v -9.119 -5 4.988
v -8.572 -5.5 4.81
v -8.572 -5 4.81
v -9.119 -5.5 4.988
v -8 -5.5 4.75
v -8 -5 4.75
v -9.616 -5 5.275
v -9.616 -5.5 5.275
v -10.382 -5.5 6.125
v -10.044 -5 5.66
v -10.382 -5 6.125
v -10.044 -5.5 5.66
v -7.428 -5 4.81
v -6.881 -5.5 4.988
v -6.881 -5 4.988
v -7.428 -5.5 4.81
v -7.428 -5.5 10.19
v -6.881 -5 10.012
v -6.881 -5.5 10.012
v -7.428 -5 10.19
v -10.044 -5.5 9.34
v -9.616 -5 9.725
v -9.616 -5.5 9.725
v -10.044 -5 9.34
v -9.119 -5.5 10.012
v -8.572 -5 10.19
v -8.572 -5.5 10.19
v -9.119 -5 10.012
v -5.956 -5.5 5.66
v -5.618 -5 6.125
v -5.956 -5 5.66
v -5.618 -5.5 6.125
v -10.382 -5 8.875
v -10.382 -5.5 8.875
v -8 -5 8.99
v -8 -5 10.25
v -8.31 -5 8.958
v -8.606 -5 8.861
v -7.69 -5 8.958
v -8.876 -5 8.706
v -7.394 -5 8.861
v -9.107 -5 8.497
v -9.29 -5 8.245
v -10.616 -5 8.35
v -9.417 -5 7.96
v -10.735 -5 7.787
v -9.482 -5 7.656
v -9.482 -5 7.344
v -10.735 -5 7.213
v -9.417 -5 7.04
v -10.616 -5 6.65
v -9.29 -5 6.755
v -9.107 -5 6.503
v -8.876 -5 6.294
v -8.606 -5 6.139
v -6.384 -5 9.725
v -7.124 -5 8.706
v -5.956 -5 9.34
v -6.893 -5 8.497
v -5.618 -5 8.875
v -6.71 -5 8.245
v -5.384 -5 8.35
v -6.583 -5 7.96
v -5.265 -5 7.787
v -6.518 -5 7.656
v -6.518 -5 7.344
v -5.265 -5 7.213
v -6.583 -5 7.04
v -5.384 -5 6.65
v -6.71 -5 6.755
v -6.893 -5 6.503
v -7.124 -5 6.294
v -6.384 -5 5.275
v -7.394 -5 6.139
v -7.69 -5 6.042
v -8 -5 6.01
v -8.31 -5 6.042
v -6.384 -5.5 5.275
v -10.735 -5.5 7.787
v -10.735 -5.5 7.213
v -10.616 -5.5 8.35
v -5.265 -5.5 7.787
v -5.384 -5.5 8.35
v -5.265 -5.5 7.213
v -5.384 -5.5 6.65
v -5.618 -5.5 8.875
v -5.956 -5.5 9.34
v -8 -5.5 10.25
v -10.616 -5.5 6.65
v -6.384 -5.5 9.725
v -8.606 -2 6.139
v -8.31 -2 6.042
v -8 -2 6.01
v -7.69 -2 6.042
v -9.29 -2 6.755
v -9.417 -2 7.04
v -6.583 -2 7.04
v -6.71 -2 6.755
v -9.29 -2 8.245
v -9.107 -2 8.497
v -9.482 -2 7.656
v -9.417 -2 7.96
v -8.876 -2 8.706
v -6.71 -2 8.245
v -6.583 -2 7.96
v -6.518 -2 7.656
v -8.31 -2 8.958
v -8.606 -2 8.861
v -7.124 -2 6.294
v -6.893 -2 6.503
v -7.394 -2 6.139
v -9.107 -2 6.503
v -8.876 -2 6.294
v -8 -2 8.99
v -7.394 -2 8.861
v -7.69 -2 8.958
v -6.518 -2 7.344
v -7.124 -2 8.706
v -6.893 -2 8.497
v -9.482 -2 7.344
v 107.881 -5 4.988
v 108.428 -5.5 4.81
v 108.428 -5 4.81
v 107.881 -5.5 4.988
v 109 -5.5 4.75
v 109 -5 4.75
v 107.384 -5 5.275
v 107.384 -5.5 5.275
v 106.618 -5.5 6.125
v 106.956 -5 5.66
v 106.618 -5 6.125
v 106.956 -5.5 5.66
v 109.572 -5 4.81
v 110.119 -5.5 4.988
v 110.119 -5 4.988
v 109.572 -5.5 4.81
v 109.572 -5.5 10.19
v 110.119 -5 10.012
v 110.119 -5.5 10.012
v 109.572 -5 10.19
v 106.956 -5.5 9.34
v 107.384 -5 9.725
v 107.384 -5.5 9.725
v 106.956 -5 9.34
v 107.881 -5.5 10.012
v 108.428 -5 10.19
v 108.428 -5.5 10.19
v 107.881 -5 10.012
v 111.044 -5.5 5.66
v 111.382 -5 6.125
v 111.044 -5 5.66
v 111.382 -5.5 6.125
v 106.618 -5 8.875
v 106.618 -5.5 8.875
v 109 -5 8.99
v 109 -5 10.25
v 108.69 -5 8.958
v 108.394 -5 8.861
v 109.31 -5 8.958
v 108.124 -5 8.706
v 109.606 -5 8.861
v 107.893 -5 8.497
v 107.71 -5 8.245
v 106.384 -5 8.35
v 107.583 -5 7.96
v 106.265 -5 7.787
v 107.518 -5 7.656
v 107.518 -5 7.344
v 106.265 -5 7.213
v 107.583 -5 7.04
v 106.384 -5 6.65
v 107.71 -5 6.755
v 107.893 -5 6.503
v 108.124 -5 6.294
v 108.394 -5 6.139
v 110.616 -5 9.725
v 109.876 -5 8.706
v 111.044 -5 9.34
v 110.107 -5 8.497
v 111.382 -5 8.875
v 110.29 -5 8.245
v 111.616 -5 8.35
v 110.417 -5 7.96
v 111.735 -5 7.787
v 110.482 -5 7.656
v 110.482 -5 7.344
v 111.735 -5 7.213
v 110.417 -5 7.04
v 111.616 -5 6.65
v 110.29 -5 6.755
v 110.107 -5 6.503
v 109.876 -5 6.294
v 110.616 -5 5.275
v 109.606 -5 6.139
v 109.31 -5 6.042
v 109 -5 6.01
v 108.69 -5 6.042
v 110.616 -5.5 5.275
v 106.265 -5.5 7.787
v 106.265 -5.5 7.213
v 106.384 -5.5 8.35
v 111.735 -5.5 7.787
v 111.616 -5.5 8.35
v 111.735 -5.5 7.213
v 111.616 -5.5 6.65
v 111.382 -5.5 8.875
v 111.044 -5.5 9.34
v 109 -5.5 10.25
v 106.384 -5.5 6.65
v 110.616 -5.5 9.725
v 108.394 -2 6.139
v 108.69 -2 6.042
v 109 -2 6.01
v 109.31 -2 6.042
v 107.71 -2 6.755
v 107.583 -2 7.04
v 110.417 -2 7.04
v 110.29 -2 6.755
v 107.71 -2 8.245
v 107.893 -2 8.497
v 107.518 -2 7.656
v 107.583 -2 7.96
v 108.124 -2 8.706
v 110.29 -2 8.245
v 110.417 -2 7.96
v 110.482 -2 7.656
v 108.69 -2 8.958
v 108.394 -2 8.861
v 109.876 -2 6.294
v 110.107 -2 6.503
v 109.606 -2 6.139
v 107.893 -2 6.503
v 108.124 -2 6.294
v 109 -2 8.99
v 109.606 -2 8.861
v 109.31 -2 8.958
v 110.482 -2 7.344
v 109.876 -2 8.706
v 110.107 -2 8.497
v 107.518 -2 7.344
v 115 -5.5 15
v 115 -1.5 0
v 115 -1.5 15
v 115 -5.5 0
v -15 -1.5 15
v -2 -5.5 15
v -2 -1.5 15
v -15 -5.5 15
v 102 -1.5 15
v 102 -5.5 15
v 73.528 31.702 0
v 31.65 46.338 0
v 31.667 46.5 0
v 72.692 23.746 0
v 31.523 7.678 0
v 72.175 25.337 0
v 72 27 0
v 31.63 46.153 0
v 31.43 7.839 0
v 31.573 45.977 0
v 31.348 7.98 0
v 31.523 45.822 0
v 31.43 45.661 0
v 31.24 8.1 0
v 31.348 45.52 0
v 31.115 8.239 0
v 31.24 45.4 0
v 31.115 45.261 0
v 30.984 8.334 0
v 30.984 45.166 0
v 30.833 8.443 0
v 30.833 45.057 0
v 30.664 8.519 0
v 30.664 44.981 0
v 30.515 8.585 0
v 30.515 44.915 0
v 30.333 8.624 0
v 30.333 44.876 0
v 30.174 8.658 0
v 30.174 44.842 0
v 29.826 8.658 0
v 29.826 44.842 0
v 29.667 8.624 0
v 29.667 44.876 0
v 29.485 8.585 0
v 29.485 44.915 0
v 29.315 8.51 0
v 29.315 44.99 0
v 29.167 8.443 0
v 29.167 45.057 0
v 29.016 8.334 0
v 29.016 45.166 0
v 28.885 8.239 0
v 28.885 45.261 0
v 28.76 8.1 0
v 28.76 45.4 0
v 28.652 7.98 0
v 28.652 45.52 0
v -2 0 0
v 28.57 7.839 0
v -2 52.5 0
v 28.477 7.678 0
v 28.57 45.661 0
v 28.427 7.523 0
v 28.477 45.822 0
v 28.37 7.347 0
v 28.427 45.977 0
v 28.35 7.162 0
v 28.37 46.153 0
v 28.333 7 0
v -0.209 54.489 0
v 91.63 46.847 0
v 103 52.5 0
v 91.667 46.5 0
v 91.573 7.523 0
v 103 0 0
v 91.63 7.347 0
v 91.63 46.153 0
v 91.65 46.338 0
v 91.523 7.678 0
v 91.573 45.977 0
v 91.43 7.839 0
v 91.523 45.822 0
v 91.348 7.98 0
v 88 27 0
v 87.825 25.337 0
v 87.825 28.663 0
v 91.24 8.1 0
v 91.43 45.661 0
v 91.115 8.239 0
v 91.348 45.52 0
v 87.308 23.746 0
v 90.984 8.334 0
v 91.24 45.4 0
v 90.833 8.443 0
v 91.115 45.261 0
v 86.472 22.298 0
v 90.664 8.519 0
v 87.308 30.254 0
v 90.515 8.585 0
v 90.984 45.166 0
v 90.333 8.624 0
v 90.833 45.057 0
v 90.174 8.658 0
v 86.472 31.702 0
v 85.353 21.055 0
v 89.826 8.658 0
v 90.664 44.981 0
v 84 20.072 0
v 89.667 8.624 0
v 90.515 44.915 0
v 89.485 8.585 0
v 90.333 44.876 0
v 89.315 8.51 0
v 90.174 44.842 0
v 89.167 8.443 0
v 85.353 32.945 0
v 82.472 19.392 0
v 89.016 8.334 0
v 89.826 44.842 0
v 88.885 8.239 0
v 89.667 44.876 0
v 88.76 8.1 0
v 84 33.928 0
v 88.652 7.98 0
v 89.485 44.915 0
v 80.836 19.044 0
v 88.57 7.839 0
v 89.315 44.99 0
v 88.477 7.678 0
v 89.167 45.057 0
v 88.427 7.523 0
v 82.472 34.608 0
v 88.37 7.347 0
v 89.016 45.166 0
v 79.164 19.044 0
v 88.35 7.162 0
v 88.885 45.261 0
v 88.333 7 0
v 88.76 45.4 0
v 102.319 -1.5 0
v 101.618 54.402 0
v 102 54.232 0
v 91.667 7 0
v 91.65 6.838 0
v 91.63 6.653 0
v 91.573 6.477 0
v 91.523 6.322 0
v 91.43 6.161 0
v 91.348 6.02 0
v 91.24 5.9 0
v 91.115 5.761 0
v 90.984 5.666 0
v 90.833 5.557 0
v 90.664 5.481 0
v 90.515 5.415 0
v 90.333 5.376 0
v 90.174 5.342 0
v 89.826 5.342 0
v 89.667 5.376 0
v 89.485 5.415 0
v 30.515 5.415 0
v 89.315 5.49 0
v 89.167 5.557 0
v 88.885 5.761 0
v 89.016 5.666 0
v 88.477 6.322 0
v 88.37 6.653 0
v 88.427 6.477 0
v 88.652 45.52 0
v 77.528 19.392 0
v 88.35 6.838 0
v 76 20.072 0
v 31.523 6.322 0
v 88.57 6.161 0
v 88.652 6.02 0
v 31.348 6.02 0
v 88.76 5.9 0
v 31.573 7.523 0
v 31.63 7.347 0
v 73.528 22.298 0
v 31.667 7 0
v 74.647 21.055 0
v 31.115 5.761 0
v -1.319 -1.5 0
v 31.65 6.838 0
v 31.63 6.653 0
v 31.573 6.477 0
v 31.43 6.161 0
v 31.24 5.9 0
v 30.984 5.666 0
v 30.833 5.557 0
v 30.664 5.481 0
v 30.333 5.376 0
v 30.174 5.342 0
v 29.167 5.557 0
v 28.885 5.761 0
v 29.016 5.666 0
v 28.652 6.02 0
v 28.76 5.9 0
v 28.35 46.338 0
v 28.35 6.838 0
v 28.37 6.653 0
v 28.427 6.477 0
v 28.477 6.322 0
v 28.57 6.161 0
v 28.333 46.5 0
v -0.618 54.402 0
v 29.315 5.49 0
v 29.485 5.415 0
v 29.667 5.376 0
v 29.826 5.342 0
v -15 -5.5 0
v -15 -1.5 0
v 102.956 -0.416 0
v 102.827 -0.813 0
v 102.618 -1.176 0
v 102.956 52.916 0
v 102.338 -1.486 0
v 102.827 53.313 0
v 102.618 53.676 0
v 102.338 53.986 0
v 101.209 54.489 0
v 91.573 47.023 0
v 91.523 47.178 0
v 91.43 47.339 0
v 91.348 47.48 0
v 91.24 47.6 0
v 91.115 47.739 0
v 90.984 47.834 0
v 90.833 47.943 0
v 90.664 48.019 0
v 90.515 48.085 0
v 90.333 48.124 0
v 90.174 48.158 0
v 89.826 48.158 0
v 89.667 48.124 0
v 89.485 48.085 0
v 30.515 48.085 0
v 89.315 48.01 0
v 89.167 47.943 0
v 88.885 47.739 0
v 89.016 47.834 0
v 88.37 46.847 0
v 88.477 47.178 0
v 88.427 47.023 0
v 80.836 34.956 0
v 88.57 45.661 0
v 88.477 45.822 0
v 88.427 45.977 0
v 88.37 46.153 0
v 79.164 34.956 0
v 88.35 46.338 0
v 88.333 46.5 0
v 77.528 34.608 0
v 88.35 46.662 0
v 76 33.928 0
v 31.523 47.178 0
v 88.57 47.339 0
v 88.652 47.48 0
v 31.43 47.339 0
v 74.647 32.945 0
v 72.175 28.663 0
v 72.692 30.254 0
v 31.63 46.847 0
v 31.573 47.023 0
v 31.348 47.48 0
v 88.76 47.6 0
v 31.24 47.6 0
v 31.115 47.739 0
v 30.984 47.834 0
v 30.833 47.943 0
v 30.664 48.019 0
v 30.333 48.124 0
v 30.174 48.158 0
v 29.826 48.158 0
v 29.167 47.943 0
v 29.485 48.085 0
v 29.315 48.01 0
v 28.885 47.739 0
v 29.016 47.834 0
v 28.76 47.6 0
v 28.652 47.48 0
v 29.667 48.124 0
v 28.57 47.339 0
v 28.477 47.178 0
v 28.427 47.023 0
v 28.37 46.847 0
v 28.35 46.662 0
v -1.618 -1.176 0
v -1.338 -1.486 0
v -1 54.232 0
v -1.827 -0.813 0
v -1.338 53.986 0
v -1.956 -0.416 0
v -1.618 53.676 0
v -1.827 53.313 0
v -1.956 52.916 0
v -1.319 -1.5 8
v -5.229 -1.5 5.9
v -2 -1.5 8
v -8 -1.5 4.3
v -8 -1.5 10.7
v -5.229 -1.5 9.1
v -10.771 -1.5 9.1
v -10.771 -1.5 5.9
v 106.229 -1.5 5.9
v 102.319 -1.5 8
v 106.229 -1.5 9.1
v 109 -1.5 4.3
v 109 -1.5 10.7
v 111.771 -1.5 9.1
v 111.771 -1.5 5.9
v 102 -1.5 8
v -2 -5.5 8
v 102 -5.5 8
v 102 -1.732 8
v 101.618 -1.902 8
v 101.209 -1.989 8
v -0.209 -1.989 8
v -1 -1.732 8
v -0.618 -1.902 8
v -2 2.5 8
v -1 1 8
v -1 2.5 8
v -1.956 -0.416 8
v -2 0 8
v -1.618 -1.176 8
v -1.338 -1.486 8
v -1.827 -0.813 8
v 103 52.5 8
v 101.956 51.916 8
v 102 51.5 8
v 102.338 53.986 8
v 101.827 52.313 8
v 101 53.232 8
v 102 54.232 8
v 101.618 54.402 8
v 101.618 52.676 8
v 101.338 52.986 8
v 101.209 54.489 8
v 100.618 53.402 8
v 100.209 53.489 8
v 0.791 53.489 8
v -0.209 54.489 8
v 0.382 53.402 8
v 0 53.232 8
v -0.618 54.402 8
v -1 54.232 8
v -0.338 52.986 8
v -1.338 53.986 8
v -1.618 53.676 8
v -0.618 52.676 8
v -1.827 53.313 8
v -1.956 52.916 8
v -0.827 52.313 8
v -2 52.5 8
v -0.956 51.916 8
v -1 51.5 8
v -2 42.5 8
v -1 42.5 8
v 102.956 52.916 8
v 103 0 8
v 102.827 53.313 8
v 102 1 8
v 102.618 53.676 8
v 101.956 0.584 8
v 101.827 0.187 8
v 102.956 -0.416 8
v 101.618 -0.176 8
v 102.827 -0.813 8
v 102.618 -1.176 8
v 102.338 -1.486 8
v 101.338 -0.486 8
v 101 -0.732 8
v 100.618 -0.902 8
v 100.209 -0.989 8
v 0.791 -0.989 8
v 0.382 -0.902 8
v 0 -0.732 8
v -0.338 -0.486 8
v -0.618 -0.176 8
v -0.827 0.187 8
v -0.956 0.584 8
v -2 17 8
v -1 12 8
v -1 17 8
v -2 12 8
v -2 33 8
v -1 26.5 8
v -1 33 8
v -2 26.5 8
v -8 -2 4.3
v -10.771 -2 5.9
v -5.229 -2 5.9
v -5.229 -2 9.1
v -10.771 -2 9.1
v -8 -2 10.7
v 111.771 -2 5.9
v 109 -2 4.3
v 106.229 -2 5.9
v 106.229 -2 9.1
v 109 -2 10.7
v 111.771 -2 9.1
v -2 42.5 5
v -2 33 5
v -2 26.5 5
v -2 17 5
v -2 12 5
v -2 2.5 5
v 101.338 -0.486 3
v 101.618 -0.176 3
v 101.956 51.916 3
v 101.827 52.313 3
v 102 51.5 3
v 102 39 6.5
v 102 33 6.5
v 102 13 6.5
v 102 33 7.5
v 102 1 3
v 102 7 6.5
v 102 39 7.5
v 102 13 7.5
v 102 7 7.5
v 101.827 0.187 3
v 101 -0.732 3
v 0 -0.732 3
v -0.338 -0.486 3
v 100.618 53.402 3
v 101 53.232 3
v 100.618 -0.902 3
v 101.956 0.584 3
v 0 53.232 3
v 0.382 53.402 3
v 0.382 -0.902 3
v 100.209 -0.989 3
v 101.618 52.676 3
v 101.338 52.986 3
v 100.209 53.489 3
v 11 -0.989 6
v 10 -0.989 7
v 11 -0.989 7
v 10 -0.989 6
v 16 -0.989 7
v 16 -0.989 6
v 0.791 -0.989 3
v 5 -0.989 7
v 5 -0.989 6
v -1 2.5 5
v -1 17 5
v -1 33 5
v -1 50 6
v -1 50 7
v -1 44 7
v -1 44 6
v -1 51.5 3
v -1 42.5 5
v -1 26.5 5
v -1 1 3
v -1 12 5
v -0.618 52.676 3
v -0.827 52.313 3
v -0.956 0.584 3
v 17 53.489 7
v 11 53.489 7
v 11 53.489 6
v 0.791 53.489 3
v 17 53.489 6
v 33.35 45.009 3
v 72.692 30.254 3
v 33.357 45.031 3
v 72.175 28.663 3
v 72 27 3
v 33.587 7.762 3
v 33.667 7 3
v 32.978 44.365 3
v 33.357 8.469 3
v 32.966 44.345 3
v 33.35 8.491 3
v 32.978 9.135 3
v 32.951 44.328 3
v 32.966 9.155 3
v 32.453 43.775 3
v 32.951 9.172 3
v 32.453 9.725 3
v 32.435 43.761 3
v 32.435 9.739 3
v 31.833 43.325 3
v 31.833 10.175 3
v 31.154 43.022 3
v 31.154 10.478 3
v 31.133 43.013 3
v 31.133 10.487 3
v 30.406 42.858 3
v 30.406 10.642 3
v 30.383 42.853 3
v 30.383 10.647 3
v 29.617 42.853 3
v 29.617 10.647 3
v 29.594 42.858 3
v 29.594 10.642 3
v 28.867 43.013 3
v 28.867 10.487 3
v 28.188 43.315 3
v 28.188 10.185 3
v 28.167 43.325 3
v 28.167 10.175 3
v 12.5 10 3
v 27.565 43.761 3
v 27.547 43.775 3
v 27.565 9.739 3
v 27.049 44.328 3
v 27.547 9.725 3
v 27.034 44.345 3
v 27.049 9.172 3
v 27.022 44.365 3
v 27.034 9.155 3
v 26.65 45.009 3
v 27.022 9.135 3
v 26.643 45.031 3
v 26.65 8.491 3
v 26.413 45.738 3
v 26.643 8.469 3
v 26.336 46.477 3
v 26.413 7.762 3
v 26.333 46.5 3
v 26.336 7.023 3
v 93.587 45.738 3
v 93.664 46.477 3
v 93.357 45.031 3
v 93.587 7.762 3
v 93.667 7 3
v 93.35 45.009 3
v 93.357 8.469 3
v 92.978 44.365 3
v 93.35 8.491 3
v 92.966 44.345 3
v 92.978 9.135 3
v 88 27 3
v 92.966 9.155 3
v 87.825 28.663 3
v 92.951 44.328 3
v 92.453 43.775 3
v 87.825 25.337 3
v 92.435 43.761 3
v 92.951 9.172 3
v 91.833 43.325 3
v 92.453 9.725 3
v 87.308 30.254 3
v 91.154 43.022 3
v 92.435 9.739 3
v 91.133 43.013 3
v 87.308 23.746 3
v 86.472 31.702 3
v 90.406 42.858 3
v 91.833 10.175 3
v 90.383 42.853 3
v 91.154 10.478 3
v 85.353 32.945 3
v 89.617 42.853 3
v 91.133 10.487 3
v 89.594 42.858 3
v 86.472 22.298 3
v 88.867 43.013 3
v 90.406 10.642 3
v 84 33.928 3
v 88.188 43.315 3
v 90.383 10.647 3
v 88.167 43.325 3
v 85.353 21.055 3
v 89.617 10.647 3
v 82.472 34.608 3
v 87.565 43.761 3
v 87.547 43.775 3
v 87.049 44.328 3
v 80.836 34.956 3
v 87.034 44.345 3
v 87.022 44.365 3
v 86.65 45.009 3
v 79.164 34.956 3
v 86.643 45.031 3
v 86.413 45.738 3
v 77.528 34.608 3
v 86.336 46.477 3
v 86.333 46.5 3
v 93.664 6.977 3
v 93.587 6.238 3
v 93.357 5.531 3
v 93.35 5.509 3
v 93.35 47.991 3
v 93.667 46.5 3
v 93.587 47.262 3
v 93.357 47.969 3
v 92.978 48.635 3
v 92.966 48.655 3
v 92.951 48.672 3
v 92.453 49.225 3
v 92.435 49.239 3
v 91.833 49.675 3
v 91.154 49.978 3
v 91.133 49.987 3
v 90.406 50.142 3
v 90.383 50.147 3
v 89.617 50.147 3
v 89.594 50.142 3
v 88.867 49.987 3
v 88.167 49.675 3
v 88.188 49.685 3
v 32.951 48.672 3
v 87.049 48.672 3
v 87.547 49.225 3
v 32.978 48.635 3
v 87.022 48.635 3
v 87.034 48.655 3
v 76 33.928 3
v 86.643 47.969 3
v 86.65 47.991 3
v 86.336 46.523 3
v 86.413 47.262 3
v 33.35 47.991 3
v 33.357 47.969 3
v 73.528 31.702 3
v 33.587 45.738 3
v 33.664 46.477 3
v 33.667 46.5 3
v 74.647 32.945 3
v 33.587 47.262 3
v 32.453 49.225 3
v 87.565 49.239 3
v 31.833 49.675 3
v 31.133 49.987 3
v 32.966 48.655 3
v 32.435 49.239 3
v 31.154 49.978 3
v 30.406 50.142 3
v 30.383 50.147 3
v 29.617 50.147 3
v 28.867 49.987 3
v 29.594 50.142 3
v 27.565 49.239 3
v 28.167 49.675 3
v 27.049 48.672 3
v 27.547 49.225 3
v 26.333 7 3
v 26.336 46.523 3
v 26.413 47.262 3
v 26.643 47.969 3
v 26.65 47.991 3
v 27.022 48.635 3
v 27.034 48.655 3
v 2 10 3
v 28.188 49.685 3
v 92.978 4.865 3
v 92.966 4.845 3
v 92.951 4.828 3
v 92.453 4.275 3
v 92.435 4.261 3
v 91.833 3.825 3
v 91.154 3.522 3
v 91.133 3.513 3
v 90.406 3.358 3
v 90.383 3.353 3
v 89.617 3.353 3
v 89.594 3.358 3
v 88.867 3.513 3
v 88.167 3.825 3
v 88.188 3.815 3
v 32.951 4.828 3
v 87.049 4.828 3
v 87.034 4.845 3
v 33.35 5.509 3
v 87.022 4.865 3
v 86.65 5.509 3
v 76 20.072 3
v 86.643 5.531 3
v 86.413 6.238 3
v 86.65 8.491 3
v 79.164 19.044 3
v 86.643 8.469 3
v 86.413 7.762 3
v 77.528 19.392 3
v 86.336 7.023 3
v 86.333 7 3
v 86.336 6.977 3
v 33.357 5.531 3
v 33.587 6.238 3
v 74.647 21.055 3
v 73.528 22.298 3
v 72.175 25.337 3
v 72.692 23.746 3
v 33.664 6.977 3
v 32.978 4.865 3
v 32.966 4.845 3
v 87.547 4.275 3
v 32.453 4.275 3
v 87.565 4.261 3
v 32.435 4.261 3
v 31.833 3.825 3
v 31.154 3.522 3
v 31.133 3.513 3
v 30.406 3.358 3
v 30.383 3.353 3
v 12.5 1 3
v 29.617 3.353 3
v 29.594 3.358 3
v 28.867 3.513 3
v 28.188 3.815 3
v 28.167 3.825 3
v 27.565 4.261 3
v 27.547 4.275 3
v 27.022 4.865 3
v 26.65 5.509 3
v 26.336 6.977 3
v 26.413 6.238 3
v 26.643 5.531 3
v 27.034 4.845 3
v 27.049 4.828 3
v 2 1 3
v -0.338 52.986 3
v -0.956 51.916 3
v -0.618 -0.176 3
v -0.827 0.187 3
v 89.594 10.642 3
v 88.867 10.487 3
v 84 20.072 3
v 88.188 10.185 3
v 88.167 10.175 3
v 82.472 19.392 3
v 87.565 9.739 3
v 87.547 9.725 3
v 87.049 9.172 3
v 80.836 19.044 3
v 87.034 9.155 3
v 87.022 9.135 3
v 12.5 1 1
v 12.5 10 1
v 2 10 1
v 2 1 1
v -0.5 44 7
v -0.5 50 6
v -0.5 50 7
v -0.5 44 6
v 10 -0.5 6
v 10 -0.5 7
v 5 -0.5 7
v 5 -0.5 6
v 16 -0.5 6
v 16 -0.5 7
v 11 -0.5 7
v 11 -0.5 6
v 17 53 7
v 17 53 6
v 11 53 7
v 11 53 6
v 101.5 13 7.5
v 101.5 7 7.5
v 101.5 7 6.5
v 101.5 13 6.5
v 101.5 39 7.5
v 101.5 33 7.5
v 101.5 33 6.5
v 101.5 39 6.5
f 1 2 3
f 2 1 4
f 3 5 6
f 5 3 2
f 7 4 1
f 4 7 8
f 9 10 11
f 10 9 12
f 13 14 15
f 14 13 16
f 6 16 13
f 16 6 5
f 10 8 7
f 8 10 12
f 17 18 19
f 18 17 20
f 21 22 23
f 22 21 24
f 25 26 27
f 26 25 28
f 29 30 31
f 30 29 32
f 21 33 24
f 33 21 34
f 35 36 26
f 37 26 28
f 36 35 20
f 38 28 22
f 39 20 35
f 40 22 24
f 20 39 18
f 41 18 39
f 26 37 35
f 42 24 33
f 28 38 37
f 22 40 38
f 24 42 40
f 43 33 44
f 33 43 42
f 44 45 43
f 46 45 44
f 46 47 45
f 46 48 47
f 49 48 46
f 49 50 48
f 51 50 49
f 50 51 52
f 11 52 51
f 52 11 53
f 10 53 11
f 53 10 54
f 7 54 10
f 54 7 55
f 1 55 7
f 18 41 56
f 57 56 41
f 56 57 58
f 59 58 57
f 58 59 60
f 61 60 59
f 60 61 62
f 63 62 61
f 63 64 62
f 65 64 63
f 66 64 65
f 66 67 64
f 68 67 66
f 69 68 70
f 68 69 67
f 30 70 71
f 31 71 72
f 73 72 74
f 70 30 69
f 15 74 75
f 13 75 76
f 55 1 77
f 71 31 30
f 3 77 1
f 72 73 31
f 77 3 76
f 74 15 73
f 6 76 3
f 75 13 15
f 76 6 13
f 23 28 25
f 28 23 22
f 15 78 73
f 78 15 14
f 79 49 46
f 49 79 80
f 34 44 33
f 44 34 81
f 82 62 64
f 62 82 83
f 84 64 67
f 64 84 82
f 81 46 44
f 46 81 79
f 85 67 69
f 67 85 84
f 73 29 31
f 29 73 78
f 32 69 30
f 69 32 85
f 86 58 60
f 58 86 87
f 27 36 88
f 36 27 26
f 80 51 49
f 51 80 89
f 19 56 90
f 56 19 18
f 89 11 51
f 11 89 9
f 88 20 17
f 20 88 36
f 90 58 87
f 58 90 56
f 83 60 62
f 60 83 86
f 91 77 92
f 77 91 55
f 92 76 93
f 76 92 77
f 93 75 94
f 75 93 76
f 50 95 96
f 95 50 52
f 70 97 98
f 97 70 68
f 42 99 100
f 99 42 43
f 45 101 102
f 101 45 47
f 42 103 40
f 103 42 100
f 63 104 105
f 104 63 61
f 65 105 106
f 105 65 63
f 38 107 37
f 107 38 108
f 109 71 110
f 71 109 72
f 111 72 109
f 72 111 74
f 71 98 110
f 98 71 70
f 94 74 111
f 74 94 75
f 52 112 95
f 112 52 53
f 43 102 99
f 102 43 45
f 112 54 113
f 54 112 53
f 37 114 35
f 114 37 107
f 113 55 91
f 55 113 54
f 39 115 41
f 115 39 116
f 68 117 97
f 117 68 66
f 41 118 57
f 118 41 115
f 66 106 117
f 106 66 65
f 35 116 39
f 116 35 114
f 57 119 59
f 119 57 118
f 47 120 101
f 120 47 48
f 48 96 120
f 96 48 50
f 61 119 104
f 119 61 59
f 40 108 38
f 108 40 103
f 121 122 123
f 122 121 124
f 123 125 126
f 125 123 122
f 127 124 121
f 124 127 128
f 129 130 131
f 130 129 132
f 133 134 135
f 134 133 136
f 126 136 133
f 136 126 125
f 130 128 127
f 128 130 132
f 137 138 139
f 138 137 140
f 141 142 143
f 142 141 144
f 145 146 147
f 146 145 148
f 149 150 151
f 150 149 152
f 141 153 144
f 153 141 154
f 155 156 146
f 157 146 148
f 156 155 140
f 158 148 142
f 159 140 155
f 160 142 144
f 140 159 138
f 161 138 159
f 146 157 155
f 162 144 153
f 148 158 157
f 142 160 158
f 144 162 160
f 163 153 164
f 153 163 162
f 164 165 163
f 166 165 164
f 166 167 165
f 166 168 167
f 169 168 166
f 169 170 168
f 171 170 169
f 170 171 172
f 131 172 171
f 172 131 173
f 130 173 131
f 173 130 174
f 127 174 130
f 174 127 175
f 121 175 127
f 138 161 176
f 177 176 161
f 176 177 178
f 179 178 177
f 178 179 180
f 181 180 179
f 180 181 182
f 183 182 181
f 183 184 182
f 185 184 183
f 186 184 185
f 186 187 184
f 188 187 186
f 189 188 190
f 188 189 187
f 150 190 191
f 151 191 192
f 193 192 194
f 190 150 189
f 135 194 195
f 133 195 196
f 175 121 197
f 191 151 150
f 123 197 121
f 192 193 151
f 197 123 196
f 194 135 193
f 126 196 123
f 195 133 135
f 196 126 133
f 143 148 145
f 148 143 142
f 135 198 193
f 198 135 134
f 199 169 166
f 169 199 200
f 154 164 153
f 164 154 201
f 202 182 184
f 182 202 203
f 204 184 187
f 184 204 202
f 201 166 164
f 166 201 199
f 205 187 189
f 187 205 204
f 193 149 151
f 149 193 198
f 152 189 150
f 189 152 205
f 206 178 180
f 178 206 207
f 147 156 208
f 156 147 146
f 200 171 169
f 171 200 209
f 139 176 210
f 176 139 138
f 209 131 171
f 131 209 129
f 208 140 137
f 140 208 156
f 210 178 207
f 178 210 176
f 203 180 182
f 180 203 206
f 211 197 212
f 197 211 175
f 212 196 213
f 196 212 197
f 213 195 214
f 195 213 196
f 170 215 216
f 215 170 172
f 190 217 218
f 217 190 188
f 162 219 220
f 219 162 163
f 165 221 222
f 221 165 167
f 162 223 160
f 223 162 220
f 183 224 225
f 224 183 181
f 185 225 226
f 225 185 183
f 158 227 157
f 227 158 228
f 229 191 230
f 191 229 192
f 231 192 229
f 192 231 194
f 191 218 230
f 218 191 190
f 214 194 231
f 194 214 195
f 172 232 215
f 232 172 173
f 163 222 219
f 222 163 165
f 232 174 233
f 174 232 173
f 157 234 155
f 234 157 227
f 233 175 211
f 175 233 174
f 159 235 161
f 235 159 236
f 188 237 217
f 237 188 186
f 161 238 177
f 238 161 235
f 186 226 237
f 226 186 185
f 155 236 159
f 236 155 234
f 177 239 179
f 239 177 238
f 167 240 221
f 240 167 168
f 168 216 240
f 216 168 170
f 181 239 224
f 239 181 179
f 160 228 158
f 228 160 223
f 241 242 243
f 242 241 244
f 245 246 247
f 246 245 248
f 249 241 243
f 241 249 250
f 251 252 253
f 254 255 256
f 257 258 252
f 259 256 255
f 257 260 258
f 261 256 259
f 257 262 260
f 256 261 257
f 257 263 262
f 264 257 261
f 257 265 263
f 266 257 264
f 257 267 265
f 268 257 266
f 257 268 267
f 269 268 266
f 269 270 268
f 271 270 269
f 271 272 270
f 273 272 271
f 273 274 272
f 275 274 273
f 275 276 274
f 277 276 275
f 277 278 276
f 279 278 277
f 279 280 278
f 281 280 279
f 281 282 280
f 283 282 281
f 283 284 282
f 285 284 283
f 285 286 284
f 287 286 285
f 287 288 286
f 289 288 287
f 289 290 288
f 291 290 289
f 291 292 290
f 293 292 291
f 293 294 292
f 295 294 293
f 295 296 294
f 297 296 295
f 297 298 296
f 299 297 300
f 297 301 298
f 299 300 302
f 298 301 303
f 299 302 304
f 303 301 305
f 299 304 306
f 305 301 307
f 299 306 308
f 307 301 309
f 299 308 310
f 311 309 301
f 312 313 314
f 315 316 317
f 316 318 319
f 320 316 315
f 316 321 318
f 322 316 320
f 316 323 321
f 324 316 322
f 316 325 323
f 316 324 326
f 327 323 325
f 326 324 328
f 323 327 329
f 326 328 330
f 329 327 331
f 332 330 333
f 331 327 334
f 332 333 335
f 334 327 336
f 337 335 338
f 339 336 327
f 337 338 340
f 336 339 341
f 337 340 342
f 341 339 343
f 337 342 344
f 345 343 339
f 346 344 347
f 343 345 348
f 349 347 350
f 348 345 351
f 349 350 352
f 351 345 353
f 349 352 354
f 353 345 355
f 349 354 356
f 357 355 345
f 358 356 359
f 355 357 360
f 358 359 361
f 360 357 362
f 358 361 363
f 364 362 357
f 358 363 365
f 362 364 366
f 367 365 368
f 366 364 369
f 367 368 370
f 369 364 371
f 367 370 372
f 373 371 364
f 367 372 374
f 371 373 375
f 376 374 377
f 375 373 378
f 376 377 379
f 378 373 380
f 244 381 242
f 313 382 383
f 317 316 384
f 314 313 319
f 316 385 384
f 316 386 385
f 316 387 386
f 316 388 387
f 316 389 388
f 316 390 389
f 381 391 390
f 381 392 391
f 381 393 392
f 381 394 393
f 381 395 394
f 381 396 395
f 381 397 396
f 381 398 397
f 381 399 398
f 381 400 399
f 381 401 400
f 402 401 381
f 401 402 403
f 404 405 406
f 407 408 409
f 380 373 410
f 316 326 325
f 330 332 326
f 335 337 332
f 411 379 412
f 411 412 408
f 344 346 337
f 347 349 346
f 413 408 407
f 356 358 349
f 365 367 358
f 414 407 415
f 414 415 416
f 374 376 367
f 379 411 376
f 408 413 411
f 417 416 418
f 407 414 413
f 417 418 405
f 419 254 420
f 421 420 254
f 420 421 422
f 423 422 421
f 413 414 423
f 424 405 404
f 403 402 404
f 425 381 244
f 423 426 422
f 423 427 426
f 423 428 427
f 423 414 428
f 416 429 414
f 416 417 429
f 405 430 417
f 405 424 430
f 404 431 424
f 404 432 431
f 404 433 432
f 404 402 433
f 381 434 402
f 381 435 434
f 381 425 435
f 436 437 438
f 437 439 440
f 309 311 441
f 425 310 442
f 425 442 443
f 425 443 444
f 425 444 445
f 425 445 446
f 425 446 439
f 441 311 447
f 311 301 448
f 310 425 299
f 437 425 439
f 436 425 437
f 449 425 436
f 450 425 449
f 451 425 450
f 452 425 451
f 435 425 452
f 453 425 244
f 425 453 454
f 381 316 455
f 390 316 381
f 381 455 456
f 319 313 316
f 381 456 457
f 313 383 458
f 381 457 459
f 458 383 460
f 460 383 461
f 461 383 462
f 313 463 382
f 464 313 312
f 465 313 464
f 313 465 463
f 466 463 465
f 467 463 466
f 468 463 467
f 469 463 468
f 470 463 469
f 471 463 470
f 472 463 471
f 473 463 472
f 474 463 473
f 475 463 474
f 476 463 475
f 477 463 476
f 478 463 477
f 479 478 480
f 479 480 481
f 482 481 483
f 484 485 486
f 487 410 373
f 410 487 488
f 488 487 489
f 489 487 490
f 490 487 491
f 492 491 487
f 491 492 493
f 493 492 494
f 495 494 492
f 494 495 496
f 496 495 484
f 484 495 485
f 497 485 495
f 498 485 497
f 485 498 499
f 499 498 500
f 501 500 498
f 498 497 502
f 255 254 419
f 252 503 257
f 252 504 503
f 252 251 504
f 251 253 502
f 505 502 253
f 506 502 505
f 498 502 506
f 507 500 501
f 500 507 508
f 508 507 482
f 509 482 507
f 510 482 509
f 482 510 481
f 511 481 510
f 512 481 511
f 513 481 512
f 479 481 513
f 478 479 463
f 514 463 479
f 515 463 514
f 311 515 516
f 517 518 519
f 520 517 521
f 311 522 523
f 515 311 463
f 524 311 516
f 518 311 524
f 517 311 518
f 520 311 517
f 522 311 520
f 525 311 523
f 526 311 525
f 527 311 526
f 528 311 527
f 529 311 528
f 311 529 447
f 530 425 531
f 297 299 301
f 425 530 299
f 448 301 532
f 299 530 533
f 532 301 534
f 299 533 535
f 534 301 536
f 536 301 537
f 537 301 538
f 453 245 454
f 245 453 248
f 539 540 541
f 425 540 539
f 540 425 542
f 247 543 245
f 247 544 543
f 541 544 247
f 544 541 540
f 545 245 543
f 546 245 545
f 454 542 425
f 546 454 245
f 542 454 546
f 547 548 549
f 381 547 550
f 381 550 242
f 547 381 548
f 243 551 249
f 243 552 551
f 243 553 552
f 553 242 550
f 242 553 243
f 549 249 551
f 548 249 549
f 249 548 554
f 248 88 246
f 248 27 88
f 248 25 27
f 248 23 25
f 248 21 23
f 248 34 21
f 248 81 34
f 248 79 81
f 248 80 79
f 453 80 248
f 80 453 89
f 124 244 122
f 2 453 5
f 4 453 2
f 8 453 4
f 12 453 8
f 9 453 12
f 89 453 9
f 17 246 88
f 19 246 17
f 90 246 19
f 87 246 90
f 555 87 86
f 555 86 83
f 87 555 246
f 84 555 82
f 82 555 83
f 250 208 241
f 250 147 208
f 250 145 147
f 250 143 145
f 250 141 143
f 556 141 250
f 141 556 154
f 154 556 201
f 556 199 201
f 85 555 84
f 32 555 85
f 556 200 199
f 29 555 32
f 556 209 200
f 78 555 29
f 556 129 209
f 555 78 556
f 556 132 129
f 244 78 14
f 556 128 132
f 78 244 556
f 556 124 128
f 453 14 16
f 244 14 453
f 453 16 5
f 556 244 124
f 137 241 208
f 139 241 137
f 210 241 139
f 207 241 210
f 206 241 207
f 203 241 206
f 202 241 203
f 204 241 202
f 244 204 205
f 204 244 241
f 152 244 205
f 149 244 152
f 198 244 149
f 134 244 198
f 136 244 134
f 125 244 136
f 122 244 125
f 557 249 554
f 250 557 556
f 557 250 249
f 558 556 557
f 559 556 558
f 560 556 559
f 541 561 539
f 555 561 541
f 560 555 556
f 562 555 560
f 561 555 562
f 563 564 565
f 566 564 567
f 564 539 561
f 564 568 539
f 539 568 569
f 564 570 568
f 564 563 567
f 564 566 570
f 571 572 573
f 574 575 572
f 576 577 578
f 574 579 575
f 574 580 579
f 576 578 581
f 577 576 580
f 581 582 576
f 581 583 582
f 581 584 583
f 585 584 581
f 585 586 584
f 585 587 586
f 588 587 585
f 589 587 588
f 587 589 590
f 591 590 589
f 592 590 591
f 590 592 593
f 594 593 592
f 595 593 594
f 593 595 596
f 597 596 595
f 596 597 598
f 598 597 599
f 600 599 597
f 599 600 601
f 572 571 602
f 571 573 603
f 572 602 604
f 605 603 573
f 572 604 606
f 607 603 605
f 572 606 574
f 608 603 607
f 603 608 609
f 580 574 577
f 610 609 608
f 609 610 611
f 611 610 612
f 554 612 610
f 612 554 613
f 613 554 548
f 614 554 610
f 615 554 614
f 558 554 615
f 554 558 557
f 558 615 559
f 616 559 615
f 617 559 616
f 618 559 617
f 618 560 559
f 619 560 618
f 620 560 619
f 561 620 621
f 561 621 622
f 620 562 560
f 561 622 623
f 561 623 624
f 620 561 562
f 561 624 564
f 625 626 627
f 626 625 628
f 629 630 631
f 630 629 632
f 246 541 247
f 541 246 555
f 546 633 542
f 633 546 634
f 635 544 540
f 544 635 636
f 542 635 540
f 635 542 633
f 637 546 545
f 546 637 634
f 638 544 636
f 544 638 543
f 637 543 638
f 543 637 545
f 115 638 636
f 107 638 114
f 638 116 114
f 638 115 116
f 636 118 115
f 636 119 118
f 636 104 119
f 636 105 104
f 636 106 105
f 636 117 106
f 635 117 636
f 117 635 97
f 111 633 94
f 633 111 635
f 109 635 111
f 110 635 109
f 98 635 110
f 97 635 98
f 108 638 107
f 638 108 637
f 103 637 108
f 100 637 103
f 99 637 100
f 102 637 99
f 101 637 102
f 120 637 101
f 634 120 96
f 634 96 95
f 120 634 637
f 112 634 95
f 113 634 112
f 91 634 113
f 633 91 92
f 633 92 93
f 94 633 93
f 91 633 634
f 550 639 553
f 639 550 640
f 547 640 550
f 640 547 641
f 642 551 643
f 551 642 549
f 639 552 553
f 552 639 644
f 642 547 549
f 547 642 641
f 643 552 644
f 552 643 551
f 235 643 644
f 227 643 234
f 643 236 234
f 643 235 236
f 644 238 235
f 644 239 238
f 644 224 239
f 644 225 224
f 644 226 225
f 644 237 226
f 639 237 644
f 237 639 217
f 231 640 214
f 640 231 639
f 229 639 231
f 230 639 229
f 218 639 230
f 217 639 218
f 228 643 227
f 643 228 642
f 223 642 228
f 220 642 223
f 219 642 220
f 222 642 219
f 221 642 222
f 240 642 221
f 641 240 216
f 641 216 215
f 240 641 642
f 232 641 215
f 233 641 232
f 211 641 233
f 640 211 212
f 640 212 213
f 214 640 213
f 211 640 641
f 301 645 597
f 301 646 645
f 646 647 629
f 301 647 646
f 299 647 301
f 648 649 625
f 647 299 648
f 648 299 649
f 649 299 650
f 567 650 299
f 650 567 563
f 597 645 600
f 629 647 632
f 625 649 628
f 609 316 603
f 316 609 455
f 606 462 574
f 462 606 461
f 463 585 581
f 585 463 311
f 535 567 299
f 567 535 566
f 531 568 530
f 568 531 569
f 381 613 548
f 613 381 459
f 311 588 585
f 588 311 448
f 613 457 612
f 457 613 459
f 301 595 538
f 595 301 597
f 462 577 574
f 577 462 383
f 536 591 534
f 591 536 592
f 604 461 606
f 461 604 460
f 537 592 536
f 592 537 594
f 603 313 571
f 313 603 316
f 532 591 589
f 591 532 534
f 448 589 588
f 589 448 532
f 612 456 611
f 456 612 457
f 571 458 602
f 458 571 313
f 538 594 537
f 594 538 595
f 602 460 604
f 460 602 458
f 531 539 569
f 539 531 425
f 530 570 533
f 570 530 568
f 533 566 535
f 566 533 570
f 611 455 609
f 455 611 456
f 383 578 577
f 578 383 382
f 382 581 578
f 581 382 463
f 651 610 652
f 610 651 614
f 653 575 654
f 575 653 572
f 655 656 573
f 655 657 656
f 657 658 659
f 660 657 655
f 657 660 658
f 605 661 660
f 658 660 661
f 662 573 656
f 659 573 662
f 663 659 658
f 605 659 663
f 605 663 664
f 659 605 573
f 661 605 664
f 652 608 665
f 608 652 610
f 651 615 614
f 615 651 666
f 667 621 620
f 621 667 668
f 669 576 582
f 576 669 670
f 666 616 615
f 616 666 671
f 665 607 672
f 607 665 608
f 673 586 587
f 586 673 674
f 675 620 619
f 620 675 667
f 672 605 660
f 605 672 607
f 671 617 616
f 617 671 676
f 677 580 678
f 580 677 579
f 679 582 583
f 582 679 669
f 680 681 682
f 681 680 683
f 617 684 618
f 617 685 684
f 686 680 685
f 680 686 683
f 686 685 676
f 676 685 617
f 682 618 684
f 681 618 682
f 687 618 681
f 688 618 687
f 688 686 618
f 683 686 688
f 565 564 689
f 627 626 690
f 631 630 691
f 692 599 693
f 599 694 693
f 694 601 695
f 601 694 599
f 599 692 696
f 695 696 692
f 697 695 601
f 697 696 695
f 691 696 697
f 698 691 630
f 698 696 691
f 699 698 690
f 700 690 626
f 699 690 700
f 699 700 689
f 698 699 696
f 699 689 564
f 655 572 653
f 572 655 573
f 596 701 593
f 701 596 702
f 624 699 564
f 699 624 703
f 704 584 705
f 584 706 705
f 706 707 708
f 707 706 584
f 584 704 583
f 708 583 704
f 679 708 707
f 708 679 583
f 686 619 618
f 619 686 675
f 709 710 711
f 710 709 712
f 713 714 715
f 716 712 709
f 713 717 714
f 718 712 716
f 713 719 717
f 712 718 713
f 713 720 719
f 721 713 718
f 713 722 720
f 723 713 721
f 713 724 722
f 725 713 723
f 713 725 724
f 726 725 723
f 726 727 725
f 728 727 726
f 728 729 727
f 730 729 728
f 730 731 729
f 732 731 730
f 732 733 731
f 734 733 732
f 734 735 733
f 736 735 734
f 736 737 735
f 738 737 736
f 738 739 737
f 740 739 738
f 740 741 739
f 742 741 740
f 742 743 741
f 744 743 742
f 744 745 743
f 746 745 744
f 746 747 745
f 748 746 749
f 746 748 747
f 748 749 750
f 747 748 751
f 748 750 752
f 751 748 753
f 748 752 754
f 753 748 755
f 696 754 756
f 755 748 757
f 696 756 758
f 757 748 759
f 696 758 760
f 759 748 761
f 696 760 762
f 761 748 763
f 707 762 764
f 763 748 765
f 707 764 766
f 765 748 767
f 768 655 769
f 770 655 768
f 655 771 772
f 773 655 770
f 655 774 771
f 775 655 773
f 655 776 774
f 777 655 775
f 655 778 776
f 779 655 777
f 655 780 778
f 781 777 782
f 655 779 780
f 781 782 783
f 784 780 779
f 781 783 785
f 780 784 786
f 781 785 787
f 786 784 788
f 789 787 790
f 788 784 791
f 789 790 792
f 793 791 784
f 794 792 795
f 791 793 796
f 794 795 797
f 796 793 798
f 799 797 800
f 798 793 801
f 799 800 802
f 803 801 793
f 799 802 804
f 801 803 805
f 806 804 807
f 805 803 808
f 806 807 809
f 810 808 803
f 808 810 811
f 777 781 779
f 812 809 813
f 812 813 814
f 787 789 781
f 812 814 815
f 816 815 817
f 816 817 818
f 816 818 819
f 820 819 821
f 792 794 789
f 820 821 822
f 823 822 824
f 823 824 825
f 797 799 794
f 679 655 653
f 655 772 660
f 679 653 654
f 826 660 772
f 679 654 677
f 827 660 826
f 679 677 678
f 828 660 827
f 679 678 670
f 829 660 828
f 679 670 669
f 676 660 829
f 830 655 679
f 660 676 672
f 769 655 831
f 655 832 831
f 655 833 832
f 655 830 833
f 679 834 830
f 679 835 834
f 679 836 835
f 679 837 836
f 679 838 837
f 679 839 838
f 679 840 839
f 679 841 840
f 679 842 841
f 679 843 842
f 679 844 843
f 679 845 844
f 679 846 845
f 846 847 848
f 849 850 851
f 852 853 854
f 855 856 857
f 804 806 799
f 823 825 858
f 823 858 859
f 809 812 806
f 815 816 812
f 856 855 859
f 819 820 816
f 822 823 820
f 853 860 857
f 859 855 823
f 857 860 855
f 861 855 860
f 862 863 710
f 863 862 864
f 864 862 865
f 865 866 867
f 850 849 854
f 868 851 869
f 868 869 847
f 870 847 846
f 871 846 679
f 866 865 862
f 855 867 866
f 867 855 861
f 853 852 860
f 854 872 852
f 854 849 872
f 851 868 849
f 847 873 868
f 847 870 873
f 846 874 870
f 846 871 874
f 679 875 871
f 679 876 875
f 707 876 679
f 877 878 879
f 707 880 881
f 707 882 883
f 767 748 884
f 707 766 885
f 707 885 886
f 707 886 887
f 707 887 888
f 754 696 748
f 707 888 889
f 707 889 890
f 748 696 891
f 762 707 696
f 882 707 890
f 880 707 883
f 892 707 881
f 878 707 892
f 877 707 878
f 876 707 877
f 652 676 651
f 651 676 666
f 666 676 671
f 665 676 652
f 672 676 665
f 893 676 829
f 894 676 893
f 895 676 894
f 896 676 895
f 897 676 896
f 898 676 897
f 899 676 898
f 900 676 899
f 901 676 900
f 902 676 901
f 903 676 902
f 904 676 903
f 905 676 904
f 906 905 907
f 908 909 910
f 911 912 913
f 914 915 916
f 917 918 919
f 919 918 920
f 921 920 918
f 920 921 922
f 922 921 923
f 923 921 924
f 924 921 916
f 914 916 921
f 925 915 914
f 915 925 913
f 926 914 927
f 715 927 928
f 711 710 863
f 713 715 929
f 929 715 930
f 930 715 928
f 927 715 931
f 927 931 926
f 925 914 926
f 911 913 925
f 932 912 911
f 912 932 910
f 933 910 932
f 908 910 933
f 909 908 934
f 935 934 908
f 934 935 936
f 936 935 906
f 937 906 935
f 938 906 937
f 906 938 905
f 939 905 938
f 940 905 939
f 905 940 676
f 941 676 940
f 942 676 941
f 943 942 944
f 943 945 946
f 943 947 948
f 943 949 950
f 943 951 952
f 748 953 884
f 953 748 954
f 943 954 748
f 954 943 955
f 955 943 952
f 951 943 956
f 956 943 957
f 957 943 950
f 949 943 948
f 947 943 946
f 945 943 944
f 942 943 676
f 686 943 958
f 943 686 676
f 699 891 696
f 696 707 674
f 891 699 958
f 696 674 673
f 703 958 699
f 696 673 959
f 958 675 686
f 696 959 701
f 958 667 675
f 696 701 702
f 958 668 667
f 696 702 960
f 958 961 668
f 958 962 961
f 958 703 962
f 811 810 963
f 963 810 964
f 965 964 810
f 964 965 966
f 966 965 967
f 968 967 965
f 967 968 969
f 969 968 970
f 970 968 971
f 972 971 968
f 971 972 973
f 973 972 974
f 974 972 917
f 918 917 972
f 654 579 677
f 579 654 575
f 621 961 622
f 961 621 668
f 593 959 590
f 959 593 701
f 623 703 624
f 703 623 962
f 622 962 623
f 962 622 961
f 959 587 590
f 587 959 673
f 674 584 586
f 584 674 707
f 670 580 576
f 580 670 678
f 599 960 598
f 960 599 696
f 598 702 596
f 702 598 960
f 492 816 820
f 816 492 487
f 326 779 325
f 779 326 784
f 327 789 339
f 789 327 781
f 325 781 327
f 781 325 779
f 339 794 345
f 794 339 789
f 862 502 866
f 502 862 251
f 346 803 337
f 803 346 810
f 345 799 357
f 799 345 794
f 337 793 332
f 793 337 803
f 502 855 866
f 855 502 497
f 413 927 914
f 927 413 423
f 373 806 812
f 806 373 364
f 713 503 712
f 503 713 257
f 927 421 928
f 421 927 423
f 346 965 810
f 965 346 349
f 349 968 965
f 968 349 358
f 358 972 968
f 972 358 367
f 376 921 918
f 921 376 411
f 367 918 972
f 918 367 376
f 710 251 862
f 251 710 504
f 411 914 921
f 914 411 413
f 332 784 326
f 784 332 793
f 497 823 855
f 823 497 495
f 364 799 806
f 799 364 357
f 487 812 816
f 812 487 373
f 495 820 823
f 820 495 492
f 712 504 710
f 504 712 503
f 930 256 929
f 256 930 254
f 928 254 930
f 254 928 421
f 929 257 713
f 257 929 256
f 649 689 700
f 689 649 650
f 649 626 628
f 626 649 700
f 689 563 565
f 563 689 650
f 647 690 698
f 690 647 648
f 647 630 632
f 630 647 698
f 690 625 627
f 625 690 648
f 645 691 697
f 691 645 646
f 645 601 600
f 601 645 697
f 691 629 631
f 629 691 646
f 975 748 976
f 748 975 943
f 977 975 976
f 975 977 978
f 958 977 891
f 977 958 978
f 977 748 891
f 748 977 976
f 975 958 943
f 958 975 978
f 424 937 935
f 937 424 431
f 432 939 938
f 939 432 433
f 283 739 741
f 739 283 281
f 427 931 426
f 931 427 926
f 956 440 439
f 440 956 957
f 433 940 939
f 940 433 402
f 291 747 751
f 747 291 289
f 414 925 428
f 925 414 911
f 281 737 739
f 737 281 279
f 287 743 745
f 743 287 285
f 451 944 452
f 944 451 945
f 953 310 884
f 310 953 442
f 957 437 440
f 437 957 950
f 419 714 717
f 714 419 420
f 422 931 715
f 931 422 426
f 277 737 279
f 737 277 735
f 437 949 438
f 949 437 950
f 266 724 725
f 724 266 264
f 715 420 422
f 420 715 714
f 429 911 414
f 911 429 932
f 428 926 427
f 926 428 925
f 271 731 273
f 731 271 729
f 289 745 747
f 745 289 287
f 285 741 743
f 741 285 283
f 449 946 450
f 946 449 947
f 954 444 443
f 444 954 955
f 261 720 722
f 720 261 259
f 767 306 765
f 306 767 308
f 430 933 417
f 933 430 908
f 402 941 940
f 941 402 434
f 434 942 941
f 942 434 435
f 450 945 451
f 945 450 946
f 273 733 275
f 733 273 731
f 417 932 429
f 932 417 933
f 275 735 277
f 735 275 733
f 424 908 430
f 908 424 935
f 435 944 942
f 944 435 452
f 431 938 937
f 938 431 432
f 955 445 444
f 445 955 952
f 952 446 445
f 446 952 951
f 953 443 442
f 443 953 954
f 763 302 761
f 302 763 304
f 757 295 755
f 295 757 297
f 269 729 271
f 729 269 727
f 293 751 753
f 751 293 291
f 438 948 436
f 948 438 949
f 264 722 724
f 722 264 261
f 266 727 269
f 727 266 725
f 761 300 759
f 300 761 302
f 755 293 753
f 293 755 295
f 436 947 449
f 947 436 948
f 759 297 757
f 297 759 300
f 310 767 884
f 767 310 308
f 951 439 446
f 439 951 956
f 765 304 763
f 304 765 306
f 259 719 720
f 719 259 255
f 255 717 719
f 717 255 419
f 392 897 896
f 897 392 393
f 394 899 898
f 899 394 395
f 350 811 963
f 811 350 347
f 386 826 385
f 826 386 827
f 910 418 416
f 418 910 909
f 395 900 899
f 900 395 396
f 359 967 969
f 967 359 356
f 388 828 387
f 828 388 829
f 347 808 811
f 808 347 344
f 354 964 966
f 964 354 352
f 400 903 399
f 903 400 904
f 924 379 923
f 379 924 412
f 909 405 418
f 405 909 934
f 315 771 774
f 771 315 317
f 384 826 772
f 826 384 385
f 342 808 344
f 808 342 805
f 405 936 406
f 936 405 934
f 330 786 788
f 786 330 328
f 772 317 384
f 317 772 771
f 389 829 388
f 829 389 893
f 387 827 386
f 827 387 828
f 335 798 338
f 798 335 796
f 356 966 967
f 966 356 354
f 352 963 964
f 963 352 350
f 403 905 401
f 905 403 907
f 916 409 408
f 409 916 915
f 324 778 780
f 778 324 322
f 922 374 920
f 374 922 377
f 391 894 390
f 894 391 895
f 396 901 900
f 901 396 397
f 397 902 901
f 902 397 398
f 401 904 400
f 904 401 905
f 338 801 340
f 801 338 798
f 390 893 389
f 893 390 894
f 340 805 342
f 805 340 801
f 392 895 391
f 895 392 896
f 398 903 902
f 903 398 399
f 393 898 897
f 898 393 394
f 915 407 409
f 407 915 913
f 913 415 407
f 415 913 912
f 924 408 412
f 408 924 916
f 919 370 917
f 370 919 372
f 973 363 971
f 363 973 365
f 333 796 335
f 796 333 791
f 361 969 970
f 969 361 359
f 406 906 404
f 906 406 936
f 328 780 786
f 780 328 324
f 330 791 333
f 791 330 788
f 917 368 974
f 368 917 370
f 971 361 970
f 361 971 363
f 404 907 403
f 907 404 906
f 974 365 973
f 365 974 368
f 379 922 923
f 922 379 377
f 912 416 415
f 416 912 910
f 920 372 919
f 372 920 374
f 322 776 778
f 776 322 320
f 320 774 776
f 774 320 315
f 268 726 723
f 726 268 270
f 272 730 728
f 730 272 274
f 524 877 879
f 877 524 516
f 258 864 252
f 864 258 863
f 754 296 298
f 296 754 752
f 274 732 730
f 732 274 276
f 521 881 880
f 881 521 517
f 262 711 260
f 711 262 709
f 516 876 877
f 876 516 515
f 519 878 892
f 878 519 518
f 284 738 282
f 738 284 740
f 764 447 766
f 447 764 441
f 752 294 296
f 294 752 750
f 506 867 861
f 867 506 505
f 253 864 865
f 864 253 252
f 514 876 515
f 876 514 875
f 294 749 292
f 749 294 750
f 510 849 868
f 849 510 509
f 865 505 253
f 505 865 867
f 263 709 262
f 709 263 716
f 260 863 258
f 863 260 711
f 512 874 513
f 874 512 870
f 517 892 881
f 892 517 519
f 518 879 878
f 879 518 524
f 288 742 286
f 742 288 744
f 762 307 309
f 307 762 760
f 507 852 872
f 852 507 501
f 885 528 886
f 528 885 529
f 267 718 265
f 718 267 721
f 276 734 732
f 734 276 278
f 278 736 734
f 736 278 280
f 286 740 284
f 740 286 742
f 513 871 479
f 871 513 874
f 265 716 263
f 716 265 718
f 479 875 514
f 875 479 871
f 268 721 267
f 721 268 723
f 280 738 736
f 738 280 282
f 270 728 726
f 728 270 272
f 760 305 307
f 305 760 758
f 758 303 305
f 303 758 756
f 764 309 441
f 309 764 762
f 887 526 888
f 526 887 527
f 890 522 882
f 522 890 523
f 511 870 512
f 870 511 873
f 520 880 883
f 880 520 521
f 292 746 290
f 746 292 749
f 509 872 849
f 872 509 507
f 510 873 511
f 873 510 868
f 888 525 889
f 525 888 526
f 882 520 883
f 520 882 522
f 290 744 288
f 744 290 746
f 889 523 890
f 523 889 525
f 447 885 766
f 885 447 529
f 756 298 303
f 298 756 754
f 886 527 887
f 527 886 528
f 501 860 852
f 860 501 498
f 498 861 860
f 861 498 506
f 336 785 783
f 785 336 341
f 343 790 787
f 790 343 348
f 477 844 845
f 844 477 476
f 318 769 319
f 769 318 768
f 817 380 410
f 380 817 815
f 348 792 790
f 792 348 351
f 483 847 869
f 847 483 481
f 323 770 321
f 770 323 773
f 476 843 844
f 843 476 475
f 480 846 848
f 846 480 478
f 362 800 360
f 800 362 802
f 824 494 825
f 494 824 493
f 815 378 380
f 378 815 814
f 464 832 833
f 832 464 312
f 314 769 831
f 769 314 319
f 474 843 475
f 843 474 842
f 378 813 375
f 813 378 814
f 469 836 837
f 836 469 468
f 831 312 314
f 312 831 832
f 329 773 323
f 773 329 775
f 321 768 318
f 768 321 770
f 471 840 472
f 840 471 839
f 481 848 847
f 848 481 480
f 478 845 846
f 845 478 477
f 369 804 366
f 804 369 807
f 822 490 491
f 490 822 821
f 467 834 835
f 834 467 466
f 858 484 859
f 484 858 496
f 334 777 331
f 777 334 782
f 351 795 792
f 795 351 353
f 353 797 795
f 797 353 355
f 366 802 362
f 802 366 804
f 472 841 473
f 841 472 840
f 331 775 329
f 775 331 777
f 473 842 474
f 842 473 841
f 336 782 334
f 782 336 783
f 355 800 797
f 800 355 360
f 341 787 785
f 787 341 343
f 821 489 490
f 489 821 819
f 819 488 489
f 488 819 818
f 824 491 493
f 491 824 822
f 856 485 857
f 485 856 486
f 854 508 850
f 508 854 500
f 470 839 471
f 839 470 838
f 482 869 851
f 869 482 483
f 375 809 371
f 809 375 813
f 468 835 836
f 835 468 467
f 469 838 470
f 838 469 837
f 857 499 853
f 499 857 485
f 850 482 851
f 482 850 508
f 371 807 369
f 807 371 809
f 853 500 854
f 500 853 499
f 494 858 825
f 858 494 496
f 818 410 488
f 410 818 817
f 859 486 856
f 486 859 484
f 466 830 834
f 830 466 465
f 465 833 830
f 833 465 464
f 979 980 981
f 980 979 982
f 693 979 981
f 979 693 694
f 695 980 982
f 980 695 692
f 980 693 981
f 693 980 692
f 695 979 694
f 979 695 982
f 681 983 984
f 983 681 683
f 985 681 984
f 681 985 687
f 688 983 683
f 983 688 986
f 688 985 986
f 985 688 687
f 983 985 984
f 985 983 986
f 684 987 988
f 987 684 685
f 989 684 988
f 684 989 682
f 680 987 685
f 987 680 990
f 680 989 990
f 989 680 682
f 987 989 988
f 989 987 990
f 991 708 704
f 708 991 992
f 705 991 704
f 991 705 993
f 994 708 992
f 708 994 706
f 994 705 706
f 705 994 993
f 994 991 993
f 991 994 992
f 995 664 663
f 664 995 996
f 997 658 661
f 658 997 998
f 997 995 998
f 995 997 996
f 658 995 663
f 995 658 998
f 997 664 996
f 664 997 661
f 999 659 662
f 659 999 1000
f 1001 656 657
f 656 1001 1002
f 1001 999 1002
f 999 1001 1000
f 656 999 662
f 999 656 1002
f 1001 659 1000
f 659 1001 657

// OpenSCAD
use <MCAD/nuts_and_bolts.scad>;

//Rascal Micro case
$fs=.25;
union()
{
// uncomment this if you want external attach tabs
  /*
	difference()
	{
		union()
		{	
			translate([30,-7,0]) cylinder(2,5,5);
			translate([25,-7,0]) cube([10,5,2]);			
			translate([90,-7,0]) cylinder(2,5,5);
			translate([85,-7,0]) cube([10,5,2]);
			translate([30,60,0]) cylinder(2,5,5);
			translate([25,55,0]) cube([10,5,2]);		
			translate([90,60,0]) cylinder(2,5,5);
			translate([85,55,0]) cube([10,5,2]);
		}
		translate([30,-7,-1]) cylinder(4,1,4);
		translate([90,-7,-1]) cylinder(4,1,4);
		translate([30,60,-1]) cylinder(4,1,4);
		translate([90,60,-1]) cylinder(4,1,4);
	}
*/

    difference(){
       translate([-15,-5.5,0]) cube([130,4,15]);
       translate([-2,-7,8]) cube([104,8,10]);
       translate([-8,-5,7.5]) rotate([-90,90,0]) boltHole(3,length=10);
       translate([109,-5,7.5]) rotate([-90,90,0]) boltHole(3,length=10);
       translate([-8,-2,7.5]) rotate([-90,90,0]) nutHole(3);
       translate([109,-2,7.5]) rotate([-90,90,0]) nutHole(3); 
    }
   
// hollowed out box
	difference()
	{
		minkowski()  		
		{
			 cube([101,52.5,6]);
             
			 cylinder(2,2,2);
		}
		translate([1,1,3]) minkowski()  		
		{
			 cube([99,50.5,4]);
			 cylinder(2,2,2);
		}

		translate([80,27,-1]) cylinder(5,8,8);  		//finger hole
		translate([-3,2.5,5]) cube([3,9.5,4]); 		//port hole power
		translate([-3,17,5]) cube([3,9.5,4]); 		//port hole USB1
		translate([-3,33,5]) cube([3,9.5,4]); 	//port hole USB2

		translate([2,1,1]) cube([10.5,9,3]); 

		translate([30,7,-1]) cylinder(4.5,1,4); 			//screw holes
		translate([90,7,-1]) cylinder(4.5,1,4);
		translate([30,46.5,-1]) cylinder(4.5,1,4);
		translate([90,46.5,-1]) cylinder(4.5,1,4);
	}	

	translate([-1.5,44,6]) cube([1,6,1]); 			//snap ledge
	translate([5,-1.5,6]) cube([5,1,1]); 				//snap ledge
	translate([11,-1.5,6]) cube([5,1,1]); 				//snap ledge
	translate([11,53,6]) cube([6,1,1]); 				//snap ledge
	translate([101.5,7,6.5]) cube([1,6,1]); 			//snap ledge
	translate([101.5,33,6.5]) cube([1,6,1]);			//snap ledge


}
